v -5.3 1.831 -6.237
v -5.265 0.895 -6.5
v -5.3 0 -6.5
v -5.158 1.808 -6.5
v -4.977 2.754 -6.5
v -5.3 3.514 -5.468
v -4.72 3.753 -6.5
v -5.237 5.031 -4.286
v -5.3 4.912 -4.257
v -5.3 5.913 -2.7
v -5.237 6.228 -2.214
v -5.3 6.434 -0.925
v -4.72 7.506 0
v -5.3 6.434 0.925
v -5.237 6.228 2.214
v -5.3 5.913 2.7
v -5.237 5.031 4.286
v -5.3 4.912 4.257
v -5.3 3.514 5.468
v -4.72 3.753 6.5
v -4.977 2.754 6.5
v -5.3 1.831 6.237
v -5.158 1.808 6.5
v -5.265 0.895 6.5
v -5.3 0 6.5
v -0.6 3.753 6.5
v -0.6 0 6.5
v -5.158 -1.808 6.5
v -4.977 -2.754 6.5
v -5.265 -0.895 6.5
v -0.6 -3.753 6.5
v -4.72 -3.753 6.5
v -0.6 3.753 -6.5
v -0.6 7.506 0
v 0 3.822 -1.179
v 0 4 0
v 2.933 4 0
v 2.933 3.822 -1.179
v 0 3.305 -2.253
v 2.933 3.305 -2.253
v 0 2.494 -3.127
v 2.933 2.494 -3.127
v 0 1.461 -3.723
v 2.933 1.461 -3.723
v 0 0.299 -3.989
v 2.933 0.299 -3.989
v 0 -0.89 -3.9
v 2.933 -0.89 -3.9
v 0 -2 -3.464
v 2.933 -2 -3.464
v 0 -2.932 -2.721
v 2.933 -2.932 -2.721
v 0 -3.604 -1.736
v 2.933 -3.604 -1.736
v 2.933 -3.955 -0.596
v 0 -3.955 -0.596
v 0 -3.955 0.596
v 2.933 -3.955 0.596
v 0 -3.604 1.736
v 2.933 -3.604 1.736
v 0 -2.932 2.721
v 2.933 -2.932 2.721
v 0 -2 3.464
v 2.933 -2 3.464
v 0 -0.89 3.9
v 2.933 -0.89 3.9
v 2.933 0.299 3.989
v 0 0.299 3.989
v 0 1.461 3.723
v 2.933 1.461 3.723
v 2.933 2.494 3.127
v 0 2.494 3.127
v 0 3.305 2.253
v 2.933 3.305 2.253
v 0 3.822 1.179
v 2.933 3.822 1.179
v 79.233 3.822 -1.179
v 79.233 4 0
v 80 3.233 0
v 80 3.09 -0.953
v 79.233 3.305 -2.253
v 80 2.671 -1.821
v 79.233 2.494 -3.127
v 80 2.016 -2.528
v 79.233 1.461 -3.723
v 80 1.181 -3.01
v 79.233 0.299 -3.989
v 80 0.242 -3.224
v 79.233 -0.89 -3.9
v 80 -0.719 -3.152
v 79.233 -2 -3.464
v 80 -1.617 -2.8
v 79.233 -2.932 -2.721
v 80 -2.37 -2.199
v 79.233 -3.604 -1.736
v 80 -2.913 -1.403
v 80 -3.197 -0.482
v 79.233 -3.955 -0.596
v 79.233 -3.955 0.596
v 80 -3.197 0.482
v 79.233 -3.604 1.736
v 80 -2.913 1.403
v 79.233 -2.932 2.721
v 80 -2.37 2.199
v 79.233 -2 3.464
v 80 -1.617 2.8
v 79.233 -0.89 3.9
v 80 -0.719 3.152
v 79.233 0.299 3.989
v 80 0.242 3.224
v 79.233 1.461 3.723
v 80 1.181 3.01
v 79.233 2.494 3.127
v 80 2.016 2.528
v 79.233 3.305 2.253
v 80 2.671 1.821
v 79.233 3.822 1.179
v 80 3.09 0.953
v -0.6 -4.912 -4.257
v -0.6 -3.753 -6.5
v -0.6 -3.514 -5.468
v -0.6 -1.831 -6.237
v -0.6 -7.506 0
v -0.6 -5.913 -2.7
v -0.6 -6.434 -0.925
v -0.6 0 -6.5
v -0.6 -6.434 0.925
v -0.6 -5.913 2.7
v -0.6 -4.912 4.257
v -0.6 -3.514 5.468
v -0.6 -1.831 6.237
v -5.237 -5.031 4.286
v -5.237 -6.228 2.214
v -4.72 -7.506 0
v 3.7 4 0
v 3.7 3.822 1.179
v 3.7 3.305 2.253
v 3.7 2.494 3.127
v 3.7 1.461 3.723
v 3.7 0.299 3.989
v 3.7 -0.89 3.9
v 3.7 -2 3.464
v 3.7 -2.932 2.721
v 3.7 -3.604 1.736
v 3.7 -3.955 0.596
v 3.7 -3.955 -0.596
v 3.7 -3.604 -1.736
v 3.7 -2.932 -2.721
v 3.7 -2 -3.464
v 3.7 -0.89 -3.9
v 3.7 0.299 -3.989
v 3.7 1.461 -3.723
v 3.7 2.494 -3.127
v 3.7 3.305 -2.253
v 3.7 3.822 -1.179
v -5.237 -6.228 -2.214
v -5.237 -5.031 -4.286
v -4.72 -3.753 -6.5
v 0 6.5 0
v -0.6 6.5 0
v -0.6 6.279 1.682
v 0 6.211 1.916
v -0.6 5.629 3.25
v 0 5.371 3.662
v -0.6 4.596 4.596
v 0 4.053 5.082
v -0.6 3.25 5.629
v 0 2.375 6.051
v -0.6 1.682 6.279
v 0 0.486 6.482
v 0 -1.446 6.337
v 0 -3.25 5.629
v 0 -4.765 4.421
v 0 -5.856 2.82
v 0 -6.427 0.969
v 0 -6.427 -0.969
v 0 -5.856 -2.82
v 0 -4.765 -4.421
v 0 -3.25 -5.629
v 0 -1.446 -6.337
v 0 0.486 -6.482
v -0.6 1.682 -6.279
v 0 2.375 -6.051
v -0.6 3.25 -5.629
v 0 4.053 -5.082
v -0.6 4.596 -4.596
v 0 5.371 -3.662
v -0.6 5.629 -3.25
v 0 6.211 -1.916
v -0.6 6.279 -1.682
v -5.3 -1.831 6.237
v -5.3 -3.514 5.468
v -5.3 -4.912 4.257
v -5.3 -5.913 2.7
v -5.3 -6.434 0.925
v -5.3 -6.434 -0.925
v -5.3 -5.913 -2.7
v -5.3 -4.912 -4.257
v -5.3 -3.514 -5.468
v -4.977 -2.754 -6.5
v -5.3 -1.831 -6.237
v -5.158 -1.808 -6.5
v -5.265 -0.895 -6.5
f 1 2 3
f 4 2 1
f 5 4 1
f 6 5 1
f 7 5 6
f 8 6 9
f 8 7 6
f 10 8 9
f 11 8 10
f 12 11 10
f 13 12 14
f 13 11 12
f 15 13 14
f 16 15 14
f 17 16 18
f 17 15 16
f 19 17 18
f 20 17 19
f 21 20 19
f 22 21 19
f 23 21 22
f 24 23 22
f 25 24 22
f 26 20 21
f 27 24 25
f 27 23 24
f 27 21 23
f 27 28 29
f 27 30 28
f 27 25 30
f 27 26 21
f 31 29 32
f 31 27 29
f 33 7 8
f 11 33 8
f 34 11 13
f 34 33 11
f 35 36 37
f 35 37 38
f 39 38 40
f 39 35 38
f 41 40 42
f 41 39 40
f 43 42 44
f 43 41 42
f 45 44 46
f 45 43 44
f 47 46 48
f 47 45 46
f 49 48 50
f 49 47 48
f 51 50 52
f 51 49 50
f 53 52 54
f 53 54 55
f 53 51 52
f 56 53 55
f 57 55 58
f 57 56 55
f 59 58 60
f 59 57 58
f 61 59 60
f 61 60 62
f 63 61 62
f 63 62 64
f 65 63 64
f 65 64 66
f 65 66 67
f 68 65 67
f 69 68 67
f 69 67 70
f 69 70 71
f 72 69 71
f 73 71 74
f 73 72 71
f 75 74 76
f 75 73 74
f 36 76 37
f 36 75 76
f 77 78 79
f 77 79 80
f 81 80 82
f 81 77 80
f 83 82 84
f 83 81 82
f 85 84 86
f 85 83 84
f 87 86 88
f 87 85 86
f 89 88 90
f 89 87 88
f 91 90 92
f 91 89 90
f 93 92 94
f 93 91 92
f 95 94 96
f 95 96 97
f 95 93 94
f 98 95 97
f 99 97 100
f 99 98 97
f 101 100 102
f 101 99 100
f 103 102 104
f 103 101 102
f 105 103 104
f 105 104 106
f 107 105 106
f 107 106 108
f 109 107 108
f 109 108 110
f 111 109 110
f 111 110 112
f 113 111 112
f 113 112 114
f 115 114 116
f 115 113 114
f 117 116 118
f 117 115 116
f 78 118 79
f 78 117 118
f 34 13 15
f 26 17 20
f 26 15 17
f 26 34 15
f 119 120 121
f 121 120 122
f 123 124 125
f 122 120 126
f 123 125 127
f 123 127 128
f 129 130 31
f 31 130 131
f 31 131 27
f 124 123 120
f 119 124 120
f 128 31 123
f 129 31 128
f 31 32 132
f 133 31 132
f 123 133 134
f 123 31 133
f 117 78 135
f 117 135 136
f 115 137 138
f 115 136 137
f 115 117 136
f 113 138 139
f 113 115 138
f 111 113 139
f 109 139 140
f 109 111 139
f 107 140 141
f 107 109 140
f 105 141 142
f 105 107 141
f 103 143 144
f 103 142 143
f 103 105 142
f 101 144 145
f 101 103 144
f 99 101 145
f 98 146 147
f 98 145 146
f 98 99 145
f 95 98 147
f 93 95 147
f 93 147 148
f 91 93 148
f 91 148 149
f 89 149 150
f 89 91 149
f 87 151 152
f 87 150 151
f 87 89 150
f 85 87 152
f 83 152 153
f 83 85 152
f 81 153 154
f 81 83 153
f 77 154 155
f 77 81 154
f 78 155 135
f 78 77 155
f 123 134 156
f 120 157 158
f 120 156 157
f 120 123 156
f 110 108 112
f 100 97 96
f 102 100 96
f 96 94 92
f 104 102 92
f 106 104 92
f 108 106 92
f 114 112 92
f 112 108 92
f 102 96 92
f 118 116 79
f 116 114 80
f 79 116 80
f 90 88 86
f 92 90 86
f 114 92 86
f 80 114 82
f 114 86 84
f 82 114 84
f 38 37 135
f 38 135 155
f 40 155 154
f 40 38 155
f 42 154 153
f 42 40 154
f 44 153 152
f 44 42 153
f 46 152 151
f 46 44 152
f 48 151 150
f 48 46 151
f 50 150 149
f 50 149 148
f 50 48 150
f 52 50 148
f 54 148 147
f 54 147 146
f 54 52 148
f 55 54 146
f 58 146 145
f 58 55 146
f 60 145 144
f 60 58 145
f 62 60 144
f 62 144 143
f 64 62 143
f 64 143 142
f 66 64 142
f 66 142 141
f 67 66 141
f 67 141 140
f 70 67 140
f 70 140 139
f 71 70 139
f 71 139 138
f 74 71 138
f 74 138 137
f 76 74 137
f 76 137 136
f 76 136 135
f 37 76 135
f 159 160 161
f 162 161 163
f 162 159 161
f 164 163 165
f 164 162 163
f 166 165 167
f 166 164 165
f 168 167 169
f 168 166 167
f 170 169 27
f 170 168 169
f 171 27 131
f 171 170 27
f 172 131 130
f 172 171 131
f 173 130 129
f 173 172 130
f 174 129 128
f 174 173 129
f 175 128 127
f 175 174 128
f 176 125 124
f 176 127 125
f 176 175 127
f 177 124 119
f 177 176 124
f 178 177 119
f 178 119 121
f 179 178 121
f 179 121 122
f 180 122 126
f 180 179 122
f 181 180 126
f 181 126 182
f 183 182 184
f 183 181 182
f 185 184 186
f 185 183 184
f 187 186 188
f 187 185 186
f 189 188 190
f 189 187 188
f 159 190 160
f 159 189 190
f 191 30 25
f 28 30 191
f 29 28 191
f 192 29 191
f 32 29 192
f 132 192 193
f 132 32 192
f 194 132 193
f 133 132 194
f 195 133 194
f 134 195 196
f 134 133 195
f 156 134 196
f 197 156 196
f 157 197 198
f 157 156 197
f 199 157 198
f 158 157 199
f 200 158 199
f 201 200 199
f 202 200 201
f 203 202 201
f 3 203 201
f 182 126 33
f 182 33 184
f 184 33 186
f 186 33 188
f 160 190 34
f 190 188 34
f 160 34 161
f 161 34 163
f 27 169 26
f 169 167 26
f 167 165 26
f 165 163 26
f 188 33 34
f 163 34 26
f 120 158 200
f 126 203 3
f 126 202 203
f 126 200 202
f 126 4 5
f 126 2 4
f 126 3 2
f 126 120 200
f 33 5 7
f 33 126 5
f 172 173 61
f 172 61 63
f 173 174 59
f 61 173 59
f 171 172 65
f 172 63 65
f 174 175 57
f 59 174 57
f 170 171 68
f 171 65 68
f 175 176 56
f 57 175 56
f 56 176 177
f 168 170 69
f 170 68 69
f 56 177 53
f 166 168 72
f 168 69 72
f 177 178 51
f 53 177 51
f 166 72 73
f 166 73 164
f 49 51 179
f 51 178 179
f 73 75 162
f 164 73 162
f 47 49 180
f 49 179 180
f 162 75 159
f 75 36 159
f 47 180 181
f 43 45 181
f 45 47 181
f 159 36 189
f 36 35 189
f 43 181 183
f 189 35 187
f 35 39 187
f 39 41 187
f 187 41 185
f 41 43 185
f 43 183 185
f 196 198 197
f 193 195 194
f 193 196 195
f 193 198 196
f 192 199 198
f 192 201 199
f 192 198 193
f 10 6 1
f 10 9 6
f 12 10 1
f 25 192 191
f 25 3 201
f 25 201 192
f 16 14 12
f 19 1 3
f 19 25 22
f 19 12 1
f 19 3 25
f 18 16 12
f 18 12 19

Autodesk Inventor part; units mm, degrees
ref_plane "YZ Plane" through (0, 0, 0) normal (1, 0, 0) x (0, 1, 0)
ref_plane "XZ Plane" through (0, 0, 0) normal (0, 1, 0) x (-1, 0, 0)
sketch "Sketch1" plane through (0, 0, 0) normal (0, 0, 1) x (1, 0, 0)
  line L0 (0, 6.5) -> (0, 4)
  line L1 (3.7, 4) -> (80, 4)
  line L2 (80, 4) -> (80, 0)
  line L3 (80, 0) -> (-0.6001, 0)
  line L4 (-16.7201, 0) -> (96.12, 0) projected
  line L5 (-0.6001, 0) -> (-0.6001, 6.5)
  line L6 (-0.6001, 6.5) -> (0, 6.5)
  line L7 (3.7, 4) -> (2.9331, 4)
  line L8 (2.9331, 4) -> (0, 4)
  line L9 (0, -1.3) -> (0, 7.8) projected
  dimension "d0" = 80
  dimension "d1" = 76.3
  dimension "d2" = 8
  dimension "d9" = 0.6001
  dimension "d10" = 13
  dimension "d13" = 0.7669
  dimension "d14" = 8
revolve "Body" add sketch "Sketch1" angle 360 about axis through (80, 0, 0) along (-1, 0, 0)
sketch "Sketch2" plane through (-0.6001, 0, 0) normal (-1, 0, 0) x (0, 0, 1)
  line L0 (0, 7.5056) -> (6.5, 3.7528)
  line L1 (6.5, 3.7528) -> (6.5, -3.7528)
  line L2 (6.5, -3.7528) -> (0, -7.5056)
  line L3 (0, -7.5056) -> (-6.5, -3.7528)
  line L4 (-6.5, -3.7528) -> (-6.5, 3.7528)
  line L5 (-6.5, 3.7528) -> (0, 7.5056)
  point P0 (0, 0)
  point P1 (0, 0)
  dimension "d11" = 13
extrude "Head" add sketch "Sketch2" along normal blind 4.7
sketch "Sketch4" plane through (0, 0, 0) normal (0, 0, 1) x (1, 0, 0)
  line L0 (-5.3001, 6.5) -> (-5.3001, 7.5056)
  line L1 (-5.3001, 7.5056) -> (-4.7195, 7.5056)
  line L2 (-4.7195, 7.5056) -> (-5.3001, 6.5)
  line L3 (-6.2401, 0) -> (0.3399, 0) projected
  line L4 (-0.6001, 7.5056) -> (-5.3001, 7.5056) projected
  line L5 (-5.3001, 3.7528) -> (-5.3001, 7.5056) projected
  dimension "d5" = 30
  dimension "d19" = 13
revolve "Chamfer1" cut sketch "Sketch4" angle 360 about axis through (-10, 0, 0) along (1, 0, 0)
thread "Thread" size "M8x1.25" class "6g" standard "ISO Metric profile" length 76.3
chamfer "Chamfer2" distance 0.7668 distance2 0.7669 1 edges at (80, -4, 0) measured on face at (80, -0.998, -0.8842)
ref_plane "Work Plane1" through (1.525, 0, 0) normal (0, 0, 1) x (1, 0, 0)
equation "\"d0\" = NLG"
equation "\"d1\" = GEL"
equation "\"d2\" = GD"
equation "\"d10\" = SD2"
equation "\"d14\" = BDM"
equation "\"d11\" = SW"
equation "\"d3\" = KOH - SD"
equation "\"d5\" = ANG1"
equation "\"d19\" = SW0"
equation "\"d15\" = GEL"
equation "\"d6\" = -0.5 * SPD + 0.5 * GD"
equation "\"NLG\" = 80"
equation "\"GD\" = NND"
equation "\"BDM\" = NND"
equation "\"KOH\" = 5.3"
equation "\"GEL\" = 76.3"
equation "\"SW\" = 13"
equation "\"SW0\" = SW"
equation "\"SPD\" = NND - 1.2269 * PTC"
equation "\"SD2\" = SW"
equation "\"SD\" = 0.6"
equation "\"ANG1\" = 30deg"
equation "\"GAL\" = 0.61345 * PTC"
equation "\"GUL\" = 0.61345 * PTC"
equation "\"RR\" = 0.4"
equation "\"WFT\" = SD"
equation "\"GD1\" = THREADDIA - 1.2269 * PTC"
equation "\"THREADDIA\" = 8"
equation "\"SDH\" = SW"
equation "\"TOA\" = 30deg"
equation "\"FAWI\" = 45deg"
equation "\"PTC\" = 1.25"
equation "\"NND\" = 8"
equation "\"E0\" = 1.155 * SW"
properties part number "AS 1110 - M8 x 80" material "Steel, Mild"
